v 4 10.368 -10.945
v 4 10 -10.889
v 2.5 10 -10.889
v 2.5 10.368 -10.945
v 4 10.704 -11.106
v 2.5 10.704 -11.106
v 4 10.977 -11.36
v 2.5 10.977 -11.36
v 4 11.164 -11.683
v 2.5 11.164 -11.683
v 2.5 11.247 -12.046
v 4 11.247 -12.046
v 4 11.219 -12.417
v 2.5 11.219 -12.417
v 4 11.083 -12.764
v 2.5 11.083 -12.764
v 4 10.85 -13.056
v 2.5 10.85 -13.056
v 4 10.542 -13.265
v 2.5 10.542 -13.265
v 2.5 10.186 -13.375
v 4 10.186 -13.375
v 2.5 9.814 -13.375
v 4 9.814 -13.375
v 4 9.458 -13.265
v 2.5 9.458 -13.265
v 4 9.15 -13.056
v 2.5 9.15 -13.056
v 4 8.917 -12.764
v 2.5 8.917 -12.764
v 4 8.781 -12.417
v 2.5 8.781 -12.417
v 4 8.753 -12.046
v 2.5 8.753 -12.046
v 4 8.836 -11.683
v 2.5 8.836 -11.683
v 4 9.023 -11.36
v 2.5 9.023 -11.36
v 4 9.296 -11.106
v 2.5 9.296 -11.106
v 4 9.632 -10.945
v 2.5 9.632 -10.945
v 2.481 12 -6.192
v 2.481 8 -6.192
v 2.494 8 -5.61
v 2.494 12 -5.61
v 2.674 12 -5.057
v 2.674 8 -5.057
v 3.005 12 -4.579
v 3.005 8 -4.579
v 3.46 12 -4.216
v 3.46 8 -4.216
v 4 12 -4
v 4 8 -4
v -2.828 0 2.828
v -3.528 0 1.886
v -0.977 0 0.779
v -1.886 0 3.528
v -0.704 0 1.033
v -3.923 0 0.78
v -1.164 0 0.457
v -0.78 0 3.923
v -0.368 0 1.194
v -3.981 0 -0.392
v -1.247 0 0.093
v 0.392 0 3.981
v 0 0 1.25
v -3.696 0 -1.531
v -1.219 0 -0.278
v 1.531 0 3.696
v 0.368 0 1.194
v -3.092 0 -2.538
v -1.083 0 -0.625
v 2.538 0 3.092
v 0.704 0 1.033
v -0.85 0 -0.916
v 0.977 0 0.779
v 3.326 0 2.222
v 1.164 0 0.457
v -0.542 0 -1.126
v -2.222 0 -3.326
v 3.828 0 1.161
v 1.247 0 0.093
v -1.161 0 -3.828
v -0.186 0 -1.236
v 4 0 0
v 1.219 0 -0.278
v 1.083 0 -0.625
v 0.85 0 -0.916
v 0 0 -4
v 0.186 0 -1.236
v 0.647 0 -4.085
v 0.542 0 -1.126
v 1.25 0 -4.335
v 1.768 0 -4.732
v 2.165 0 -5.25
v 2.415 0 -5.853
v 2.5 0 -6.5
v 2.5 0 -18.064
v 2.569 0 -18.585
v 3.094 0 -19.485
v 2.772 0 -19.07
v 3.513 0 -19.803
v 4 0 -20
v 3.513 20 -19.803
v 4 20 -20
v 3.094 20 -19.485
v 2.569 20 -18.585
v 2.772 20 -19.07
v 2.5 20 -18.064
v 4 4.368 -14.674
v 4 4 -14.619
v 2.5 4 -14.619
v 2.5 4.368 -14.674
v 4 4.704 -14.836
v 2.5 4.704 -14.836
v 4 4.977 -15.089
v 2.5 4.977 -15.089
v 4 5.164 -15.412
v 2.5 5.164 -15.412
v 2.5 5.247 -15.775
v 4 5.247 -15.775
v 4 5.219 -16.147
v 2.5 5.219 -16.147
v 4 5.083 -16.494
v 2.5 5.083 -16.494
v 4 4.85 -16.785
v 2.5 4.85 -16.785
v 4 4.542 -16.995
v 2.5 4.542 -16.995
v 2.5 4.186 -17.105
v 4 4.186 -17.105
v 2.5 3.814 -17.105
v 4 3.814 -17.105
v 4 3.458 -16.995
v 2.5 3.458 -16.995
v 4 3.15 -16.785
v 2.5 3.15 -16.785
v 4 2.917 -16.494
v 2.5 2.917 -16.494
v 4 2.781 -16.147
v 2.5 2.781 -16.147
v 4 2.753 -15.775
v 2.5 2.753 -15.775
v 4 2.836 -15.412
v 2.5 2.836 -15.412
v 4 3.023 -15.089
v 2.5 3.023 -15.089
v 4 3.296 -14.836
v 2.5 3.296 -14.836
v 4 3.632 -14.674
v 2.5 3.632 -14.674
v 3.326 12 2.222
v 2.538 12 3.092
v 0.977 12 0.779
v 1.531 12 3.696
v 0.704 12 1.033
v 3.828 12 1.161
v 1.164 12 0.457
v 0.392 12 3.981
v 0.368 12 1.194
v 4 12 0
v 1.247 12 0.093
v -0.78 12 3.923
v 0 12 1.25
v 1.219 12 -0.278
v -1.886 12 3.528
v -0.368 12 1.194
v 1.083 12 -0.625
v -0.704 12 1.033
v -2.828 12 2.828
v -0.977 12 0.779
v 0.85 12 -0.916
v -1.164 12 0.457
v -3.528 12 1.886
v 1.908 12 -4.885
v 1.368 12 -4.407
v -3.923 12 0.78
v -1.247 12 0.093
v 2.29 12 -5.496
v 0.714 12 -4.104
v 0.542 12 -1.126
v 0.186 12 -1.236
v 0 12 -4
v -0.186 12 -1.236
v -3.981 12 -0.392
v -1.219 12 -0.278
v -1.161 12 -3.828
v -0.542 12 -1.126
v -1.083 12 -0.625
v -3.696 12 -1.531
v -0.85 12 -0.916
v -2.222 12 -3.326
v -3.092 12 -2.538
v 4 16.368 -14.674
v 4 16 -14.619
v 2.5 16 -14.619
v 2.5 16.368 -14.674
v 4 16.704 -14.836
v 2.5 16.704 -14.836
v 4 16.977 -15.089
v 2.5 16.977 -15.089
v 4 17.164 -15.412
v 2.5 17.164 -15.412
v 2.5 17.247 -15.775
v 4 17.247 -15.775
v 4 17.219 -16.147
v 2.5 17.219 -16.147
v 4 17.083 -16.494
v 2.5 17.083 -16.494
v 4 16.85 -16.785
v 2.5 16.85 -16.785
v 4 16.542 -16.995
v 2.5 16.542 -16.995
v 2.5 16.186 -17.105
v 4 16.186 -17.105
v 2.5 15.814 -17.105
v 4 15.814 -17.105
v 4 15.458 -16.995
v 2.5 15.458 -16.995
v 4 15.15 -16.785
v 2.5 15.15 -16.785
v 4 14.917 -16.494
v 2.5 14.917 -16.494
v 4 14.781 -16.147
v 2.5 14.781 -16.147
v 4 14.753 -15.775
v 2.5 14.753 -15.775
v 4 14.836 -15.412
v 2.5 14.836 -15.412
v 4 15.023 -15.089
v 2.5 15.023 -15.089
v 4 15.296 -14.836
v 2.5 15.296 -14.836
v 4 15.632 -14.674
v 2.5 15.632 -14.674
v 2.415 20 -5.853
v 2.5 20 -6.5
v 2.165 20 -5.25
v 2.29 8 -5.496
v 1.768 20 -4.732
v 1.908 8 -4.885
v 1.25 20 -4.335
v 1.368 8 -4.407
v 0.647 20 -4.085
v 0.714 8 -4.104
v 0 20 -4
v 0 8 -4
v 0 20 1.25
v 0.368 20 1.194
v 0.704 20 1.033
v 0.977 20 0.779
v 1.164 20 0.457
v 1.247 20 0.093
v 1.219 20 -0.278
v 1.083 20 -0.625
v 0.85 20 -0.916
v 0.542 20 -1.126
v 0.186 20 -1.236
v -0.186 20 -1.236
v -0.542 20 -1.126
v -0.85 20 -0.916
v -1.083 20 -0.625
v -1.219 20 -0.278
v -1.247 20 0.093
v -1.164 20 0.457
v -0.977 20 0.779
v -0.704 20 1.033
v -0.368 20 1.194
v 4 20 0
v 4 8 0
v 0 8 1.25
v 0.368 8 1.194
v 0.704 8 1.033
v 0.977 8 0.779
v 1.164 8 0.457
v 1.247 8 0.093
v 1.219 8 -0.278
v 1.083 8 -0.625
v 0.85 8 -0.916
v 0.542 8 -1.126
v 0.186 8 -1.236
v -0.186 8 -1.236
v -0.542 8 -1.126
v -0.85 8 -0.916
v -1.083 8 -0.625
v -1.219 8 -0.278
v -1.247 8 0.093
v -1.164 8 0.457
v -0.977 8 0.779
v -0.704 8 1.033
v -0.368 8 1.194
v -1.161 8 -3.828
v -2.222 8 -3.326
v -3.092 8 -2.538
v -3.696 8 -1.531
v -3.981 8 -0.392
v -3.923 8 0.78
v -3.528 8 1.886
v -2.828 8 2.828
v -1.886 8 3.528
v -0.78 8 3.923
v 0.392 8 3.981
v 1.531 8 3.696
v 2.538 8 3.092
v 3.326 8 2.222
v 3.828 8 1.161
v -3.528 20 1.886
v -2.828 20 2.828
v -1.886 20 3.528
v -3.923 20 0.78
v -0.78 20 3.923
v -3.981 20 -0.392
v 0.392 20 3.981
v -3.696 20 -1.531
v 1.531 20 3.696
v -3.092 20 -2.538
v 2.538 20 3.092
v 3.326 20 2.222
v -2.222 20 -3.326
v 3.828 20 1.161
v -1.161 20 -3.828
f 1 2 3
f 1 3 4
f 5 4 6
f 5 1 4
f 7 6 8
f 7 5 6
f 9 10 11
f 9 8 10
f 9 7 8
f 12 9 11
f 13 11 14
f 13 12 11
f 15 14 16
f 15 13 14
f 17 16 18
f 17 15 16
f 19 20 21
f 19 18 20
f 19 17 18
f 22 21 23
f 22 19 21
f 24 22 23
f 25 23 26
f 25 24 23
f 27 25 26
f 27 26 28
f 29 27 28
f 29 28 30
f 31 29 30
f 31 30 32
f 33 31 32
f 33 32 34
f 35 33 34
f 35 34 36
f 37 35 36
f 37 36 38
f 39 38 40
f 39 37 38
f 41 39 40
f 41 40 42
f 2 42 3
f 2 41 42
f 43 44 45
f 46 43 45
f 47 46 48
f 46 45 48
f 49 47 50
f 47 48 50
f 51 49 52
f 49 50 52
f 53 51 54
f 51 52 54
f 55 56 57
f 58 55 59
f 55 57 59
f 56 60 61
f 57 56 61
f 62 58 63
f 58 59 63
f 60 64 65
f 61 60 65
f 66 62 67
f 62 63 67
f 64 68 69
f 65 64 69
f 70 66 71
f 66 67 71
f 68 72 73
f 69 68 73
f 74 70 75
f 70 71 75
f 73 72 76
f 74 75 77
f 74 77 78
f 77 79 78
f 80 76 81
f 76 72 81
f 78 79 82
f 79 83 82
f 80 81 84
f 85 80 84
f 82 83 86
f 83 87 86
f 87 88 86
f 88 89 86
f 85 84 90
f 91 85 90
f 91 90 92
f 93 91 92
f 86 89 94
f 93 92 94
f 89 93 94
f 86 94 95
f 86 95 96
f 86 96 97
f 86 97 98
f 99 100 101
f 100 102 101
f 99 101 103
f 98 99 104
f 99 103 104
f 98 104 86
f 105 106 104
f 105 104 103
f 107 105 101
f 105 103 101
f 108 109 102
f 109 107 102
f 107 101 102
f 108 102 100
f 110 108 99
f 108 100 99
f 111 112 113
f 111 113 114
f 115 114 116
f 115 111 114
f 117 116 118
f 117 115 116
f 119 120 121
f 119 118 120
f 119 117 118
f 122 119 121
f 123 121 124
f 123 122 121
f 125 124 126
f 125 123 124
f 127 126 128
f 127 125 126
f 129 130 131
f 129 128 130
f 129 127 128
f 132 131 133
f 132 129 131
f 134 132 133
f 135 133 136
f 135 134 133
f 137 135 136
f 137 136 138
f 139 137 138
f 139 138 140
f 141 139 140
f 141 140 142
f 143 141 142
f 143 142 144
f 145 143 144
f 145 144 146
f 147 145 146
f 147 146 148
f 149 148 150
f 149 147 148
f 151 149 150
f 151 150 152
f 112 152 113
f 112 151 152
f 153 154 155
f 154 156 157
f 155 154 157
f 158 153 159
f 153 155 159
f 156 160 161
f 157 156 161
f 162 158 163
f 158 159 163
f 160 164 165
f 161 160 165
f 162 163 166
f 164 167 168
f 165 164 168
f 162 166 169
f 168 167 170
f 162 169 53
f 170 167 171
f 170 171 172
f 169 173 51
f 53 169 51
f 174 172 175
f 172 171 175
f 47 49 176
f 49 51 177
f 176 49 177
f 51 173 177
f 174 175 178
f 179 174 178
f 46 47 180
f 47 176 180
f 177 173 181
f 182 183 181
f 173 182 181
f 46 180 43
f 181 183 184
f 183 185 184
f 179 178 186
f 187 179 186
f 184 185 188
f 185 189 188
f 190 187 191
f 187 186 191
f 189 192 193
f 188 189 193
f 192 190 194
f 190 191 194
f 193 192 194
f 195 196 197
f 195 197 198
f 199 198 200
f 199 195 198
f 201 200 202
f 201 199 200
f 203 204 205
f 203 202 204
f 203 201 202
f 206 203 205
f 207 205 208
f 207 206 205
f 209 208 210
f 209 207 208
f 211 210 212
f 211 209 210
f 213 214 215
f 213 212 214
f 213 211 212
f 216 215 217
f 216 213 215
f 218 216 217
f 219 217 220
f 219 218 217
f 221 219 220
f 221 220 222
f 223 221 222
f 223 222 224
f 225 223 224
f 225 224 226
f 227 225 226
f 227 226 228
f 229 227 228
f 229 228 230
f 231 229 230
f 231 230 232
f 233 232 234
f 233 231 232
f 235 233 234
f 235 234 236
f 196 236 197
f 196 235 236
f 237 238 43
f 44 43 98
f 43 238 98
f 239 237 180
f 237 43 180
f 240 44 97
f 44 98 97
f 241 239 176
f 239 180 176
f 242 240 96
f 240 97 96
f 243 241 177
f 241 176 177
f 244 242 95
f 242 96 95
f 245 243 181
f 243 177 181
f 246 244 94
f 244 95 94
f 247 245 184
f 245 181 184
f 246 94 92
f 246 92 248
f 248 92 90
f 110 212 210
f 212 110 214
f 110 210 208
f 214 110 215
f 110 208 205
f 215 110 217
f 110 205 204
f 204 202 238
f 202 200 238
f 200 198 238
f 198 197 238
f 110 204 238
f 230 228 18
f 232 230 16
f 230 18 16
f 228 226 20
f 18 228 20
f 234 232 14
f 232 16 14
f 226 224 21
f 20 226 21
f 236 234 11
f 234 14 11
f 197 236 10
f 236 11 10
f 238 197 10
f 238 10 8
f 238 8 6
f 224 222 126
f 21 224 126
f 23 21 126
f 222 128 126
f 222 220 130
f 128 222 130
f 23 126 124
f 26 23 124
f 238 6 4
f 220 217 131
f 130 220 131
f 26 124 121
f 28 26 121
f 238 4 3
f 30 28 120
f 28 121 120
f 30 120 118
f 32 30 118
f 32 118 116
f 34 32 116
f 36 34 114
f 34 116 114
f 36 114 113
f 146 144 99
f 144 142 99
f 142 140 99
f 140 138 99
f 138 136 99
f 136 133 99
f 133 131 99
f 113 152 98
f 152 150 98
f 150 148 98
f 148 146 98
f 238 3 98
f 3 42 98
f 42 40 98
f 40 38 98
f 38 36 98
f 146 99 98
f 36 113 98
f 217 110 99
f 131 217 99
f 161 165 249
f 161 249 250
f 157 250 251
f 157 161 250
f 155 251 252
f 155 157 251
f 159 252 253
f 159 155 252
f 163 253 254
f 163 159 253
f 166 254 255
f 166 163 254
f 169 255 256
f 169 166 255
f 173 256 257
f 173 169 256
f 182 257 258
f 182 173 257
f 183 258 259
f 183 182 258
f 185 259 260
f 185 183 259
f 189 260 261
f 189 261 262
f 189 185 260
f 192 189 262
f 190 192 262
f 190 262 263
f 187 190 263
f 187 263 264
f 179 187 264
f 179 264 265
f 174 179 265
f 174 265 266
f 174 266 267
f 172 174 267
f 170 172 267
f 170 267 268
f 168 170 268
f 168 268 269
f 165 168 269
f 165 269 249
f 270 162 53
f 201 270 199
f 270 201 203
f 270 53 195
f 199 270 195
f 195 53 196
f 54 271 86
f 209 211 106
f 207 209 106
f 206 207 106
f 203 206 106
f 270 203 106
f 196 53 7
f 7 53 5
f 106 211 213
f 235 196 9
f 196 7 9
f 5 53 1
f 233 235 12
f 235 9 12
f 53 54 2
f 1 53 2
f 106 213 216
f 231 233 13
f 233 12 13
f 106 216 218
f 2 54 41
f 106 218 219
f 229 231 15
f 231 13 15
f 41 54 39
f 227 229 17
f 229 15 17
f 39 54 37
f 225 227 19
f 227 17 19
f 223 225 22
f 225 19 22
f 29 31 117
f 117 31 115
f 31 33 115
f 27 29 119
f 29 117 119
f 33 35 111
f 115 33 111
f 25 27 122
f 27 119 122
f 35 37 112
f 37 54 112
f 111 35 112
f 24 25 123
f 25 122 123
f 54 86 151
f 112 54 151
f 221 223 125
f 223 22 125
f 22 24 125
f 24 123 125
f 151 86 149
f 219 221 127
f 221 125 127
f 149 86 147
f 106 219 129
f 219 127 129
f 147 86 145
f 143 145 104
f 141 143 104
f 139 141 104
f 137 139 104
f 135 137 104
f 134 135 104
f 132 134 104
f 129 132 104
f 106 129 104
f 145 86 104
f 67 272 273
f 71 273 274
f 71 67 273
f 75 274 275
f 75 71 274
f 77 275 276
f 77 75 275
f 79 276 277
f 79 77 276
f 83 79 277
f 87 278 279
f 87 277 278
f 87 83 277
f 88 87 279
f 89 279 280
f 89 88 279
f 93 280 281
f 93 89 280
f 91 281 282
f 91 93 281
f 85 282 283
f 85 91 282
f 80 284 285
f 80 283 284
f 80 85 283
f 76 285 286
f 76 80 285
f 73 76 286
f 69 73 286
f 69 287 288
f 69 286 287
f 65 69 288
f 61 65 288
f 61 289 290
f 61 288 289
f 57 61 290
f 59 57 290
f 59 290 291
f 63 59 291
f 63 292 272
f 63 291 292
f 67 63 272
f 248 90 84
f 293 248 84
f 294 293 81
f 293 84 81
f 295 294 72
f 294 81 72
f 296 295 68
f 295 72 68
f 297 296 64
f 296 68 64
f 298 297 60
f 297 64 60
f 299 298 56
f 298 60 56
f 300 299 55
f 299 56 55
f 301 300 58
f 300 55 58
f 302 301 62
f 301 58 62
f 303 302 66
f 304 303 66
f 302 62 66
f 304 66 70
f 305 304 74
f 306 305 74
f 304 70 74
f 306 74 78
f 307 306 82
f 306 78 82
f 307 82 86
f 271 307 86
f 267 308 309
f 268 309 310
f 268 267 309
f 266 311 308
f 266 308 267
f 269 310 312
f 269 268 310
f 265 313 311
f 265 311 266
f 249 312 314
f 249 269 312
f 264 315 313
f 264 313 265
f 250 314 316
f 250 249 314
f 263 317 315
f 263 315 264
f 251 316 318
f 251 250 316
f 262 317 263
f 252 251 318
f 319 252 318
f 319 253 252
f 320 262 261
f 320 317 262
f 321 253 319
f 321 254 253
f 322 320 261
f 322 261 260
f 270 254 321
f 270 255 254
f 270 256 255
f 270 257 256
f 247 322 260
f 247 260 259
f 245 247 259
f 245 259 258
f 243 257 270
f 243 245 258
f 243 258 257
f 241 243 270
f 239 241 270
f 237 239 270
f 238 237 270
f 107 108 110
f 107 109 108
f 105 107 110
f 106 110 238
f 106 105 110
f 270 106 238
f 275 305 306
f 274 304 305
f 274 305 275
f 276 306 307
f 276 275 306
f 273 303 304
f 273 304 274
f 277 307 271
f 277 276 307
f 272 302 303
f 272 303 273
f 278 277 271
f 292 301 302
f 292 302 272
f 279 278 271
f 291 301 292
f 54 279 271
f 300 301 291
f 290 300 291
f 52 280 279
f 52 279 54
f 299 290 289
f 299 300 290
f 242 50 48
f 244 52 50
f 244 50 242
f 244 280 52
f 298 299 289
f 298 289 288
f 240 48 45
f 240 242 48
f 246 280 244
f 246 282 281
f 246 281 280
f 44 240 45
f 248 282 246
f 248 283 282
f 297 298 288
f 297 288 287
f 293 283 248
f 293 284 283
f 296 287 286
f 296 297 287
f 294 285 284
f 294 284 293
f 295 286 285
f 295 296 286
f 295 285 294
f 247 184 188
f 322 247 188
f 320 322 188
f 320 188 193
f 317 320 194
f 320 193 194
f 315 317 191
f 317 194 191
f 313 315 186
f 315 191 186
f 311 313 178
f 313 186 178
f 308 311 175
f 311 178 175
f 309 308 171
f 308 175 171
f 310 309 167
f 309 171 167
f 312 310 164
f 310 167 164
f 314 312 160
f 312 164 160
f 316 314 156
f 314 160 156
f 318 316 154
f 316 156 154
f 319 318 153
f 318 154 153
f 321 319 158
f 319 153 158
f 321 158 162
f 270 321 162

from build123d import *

# Parameters (mm, degrees)
SKETCH1_R               = 1.25
BOSS_EXTRUDE1_DEPTH     = 20
CUT_EXTRUDE1_DEPTH      = 30.021543722
CUT_EXTRUDE1_DEPTH_BACK = 30.021543722
SKETCH2_R               = 1.25
CUT_EXTRUDE2_DEPTH      = 29.565713714
CUT_EXTRUDE2_DEPTH_BACK = 29.565713714
SKETCH3_W               = 8
SKETCH3_H               = 4
FILLET1_R               = 2


with BuildPart() as part:
    # Sketch1 → Boss-Extrude1 (new body)
    with BuildSketch(Plane(origin=(0, 0, 0), x_dir=(1, 0, 0), z_dir=(0, 1, 0))):
        with BuildLine():
            Line((4, 0), (4, 20))
            Line((4, 20), (2.5, 20))
            Line((2.5, 20), (2.5, 15.120027663))
            Line((2.5, 15.120027663), (2.5, 6.5))
            ThreePointArc((2.5, 6.5), (1.767766953, 4.732233047), (0, 4))
            ThreePointArc((0, 4), (-2.828427125, -2.828427125), (4, 0))
        make_face()
        with Locations(Location((0, 0, 0), (0, 0, 270))):
            Circle(SKETCH1_R, mode=Mode.SUBTRACT)
    extrude(amount=BOSS_EXTRUDE1_DEPTH)

    # Sketch2 → Cut-Extrude1 (cut, two sides: drawn at the far end of the back side and taken through both)
    with BuildSketch(Plane.ZY.offset(-2.5).offset(-CUT_EXTRUDE1_DEPTH_BACK)):
        with Locations((-12.139236455, 10)):
            Circle(SKETCH2_R)
        with Locations((-15.86873762, 4)):
            Circle(SKETCH2_R)
        with Locations((-15.86873762, 16)):
            Circle(SKETCH2_R)
    extrude(amount=CUT_EXTRUDE1_DEPTH + CUT_EXTRUDE1_DEPTH_BACK, mode=Mode.SUBTRACT)

    # Sketch3 → Cut-Extrude2 (cut, two sides: drawn at the far end of the back side and taken through both)
    with BuildSketch(Plane(origin=(0, 0, 0), x_dir=(0, 0, -1), z_dir=(1, 0, 0)).offset(-CUT_EXTRUDE2_DEPTH_BACK)):
        with Locations((0, 10)):
            Rectangle(SKETCH3_W, SKETCH3_H)
    extrude(amount=CUT_EXTRUDE2_DEPTH + CUT_EXTRUDE2_DEPTH_BACK, mode=Mode.SUBTRACT)

    # Fillet1
    # the kernel refuses this fillet: 2 mm, written as the material it takes off along each edge
    with BuildSketch(Plane(origin=(2.5, -4.841229183, -20), x_dir=(0, 0, 1), z_dir=(0, 1, 0))) as fillet1_piece_1:
        with BuildLine():
            CenterArc((1.936491673, 2), FILLET1_R, 194.477512186, 75.522487814)
            Line((0, 1.5), (-0.038729833, 1.49))
            ThreePointArc((-0.038729833, 1.49), (-0.04, 0.75), (-0.04, 0))
            Line((-0.04, 0), (0, -0.04))
            Line((0, -0.04), (1.936491673, -0.04))
            Line((1.936491673, -0.04), (1.936491673, 0))
        make_face()
    extrude(amount=29.682458366, mode=Mode.SUBTRACT)
    with BuildSketch(Plane(origin=(0, 8, -4), x_dir=(0.7494414478105039, 0, -0.6620706278817206), z_dir=(0, 1, 0))) as fillet1_piece_2:
        with BuildLine():
            CenterArc((4.634494395, -1.498882896), FILLET1_R, 131.457982482, 83.620629792)
            Line((2.997765791, -2.648282512), (2.965031219, -2.671270504))
            ThreePointArc((2.965031219, -2.671270504), (1.472400071, -1.354118914), (-0.026482825, -0.029977658))
            Line((-0.026482825, -0.029977658), (0.026482825, 0.029977658))
            ThreePointArc((0.026482825, 0.029977658), (1.65517657, -0.58639638), (3.283870314, 0.029977658))
            Line((3.283870314, 0.029977658), (3.310353139, 0))
        make_face()
    extrude(amount=4, mode=Mode.SUBTRACT)


solid = part.part
